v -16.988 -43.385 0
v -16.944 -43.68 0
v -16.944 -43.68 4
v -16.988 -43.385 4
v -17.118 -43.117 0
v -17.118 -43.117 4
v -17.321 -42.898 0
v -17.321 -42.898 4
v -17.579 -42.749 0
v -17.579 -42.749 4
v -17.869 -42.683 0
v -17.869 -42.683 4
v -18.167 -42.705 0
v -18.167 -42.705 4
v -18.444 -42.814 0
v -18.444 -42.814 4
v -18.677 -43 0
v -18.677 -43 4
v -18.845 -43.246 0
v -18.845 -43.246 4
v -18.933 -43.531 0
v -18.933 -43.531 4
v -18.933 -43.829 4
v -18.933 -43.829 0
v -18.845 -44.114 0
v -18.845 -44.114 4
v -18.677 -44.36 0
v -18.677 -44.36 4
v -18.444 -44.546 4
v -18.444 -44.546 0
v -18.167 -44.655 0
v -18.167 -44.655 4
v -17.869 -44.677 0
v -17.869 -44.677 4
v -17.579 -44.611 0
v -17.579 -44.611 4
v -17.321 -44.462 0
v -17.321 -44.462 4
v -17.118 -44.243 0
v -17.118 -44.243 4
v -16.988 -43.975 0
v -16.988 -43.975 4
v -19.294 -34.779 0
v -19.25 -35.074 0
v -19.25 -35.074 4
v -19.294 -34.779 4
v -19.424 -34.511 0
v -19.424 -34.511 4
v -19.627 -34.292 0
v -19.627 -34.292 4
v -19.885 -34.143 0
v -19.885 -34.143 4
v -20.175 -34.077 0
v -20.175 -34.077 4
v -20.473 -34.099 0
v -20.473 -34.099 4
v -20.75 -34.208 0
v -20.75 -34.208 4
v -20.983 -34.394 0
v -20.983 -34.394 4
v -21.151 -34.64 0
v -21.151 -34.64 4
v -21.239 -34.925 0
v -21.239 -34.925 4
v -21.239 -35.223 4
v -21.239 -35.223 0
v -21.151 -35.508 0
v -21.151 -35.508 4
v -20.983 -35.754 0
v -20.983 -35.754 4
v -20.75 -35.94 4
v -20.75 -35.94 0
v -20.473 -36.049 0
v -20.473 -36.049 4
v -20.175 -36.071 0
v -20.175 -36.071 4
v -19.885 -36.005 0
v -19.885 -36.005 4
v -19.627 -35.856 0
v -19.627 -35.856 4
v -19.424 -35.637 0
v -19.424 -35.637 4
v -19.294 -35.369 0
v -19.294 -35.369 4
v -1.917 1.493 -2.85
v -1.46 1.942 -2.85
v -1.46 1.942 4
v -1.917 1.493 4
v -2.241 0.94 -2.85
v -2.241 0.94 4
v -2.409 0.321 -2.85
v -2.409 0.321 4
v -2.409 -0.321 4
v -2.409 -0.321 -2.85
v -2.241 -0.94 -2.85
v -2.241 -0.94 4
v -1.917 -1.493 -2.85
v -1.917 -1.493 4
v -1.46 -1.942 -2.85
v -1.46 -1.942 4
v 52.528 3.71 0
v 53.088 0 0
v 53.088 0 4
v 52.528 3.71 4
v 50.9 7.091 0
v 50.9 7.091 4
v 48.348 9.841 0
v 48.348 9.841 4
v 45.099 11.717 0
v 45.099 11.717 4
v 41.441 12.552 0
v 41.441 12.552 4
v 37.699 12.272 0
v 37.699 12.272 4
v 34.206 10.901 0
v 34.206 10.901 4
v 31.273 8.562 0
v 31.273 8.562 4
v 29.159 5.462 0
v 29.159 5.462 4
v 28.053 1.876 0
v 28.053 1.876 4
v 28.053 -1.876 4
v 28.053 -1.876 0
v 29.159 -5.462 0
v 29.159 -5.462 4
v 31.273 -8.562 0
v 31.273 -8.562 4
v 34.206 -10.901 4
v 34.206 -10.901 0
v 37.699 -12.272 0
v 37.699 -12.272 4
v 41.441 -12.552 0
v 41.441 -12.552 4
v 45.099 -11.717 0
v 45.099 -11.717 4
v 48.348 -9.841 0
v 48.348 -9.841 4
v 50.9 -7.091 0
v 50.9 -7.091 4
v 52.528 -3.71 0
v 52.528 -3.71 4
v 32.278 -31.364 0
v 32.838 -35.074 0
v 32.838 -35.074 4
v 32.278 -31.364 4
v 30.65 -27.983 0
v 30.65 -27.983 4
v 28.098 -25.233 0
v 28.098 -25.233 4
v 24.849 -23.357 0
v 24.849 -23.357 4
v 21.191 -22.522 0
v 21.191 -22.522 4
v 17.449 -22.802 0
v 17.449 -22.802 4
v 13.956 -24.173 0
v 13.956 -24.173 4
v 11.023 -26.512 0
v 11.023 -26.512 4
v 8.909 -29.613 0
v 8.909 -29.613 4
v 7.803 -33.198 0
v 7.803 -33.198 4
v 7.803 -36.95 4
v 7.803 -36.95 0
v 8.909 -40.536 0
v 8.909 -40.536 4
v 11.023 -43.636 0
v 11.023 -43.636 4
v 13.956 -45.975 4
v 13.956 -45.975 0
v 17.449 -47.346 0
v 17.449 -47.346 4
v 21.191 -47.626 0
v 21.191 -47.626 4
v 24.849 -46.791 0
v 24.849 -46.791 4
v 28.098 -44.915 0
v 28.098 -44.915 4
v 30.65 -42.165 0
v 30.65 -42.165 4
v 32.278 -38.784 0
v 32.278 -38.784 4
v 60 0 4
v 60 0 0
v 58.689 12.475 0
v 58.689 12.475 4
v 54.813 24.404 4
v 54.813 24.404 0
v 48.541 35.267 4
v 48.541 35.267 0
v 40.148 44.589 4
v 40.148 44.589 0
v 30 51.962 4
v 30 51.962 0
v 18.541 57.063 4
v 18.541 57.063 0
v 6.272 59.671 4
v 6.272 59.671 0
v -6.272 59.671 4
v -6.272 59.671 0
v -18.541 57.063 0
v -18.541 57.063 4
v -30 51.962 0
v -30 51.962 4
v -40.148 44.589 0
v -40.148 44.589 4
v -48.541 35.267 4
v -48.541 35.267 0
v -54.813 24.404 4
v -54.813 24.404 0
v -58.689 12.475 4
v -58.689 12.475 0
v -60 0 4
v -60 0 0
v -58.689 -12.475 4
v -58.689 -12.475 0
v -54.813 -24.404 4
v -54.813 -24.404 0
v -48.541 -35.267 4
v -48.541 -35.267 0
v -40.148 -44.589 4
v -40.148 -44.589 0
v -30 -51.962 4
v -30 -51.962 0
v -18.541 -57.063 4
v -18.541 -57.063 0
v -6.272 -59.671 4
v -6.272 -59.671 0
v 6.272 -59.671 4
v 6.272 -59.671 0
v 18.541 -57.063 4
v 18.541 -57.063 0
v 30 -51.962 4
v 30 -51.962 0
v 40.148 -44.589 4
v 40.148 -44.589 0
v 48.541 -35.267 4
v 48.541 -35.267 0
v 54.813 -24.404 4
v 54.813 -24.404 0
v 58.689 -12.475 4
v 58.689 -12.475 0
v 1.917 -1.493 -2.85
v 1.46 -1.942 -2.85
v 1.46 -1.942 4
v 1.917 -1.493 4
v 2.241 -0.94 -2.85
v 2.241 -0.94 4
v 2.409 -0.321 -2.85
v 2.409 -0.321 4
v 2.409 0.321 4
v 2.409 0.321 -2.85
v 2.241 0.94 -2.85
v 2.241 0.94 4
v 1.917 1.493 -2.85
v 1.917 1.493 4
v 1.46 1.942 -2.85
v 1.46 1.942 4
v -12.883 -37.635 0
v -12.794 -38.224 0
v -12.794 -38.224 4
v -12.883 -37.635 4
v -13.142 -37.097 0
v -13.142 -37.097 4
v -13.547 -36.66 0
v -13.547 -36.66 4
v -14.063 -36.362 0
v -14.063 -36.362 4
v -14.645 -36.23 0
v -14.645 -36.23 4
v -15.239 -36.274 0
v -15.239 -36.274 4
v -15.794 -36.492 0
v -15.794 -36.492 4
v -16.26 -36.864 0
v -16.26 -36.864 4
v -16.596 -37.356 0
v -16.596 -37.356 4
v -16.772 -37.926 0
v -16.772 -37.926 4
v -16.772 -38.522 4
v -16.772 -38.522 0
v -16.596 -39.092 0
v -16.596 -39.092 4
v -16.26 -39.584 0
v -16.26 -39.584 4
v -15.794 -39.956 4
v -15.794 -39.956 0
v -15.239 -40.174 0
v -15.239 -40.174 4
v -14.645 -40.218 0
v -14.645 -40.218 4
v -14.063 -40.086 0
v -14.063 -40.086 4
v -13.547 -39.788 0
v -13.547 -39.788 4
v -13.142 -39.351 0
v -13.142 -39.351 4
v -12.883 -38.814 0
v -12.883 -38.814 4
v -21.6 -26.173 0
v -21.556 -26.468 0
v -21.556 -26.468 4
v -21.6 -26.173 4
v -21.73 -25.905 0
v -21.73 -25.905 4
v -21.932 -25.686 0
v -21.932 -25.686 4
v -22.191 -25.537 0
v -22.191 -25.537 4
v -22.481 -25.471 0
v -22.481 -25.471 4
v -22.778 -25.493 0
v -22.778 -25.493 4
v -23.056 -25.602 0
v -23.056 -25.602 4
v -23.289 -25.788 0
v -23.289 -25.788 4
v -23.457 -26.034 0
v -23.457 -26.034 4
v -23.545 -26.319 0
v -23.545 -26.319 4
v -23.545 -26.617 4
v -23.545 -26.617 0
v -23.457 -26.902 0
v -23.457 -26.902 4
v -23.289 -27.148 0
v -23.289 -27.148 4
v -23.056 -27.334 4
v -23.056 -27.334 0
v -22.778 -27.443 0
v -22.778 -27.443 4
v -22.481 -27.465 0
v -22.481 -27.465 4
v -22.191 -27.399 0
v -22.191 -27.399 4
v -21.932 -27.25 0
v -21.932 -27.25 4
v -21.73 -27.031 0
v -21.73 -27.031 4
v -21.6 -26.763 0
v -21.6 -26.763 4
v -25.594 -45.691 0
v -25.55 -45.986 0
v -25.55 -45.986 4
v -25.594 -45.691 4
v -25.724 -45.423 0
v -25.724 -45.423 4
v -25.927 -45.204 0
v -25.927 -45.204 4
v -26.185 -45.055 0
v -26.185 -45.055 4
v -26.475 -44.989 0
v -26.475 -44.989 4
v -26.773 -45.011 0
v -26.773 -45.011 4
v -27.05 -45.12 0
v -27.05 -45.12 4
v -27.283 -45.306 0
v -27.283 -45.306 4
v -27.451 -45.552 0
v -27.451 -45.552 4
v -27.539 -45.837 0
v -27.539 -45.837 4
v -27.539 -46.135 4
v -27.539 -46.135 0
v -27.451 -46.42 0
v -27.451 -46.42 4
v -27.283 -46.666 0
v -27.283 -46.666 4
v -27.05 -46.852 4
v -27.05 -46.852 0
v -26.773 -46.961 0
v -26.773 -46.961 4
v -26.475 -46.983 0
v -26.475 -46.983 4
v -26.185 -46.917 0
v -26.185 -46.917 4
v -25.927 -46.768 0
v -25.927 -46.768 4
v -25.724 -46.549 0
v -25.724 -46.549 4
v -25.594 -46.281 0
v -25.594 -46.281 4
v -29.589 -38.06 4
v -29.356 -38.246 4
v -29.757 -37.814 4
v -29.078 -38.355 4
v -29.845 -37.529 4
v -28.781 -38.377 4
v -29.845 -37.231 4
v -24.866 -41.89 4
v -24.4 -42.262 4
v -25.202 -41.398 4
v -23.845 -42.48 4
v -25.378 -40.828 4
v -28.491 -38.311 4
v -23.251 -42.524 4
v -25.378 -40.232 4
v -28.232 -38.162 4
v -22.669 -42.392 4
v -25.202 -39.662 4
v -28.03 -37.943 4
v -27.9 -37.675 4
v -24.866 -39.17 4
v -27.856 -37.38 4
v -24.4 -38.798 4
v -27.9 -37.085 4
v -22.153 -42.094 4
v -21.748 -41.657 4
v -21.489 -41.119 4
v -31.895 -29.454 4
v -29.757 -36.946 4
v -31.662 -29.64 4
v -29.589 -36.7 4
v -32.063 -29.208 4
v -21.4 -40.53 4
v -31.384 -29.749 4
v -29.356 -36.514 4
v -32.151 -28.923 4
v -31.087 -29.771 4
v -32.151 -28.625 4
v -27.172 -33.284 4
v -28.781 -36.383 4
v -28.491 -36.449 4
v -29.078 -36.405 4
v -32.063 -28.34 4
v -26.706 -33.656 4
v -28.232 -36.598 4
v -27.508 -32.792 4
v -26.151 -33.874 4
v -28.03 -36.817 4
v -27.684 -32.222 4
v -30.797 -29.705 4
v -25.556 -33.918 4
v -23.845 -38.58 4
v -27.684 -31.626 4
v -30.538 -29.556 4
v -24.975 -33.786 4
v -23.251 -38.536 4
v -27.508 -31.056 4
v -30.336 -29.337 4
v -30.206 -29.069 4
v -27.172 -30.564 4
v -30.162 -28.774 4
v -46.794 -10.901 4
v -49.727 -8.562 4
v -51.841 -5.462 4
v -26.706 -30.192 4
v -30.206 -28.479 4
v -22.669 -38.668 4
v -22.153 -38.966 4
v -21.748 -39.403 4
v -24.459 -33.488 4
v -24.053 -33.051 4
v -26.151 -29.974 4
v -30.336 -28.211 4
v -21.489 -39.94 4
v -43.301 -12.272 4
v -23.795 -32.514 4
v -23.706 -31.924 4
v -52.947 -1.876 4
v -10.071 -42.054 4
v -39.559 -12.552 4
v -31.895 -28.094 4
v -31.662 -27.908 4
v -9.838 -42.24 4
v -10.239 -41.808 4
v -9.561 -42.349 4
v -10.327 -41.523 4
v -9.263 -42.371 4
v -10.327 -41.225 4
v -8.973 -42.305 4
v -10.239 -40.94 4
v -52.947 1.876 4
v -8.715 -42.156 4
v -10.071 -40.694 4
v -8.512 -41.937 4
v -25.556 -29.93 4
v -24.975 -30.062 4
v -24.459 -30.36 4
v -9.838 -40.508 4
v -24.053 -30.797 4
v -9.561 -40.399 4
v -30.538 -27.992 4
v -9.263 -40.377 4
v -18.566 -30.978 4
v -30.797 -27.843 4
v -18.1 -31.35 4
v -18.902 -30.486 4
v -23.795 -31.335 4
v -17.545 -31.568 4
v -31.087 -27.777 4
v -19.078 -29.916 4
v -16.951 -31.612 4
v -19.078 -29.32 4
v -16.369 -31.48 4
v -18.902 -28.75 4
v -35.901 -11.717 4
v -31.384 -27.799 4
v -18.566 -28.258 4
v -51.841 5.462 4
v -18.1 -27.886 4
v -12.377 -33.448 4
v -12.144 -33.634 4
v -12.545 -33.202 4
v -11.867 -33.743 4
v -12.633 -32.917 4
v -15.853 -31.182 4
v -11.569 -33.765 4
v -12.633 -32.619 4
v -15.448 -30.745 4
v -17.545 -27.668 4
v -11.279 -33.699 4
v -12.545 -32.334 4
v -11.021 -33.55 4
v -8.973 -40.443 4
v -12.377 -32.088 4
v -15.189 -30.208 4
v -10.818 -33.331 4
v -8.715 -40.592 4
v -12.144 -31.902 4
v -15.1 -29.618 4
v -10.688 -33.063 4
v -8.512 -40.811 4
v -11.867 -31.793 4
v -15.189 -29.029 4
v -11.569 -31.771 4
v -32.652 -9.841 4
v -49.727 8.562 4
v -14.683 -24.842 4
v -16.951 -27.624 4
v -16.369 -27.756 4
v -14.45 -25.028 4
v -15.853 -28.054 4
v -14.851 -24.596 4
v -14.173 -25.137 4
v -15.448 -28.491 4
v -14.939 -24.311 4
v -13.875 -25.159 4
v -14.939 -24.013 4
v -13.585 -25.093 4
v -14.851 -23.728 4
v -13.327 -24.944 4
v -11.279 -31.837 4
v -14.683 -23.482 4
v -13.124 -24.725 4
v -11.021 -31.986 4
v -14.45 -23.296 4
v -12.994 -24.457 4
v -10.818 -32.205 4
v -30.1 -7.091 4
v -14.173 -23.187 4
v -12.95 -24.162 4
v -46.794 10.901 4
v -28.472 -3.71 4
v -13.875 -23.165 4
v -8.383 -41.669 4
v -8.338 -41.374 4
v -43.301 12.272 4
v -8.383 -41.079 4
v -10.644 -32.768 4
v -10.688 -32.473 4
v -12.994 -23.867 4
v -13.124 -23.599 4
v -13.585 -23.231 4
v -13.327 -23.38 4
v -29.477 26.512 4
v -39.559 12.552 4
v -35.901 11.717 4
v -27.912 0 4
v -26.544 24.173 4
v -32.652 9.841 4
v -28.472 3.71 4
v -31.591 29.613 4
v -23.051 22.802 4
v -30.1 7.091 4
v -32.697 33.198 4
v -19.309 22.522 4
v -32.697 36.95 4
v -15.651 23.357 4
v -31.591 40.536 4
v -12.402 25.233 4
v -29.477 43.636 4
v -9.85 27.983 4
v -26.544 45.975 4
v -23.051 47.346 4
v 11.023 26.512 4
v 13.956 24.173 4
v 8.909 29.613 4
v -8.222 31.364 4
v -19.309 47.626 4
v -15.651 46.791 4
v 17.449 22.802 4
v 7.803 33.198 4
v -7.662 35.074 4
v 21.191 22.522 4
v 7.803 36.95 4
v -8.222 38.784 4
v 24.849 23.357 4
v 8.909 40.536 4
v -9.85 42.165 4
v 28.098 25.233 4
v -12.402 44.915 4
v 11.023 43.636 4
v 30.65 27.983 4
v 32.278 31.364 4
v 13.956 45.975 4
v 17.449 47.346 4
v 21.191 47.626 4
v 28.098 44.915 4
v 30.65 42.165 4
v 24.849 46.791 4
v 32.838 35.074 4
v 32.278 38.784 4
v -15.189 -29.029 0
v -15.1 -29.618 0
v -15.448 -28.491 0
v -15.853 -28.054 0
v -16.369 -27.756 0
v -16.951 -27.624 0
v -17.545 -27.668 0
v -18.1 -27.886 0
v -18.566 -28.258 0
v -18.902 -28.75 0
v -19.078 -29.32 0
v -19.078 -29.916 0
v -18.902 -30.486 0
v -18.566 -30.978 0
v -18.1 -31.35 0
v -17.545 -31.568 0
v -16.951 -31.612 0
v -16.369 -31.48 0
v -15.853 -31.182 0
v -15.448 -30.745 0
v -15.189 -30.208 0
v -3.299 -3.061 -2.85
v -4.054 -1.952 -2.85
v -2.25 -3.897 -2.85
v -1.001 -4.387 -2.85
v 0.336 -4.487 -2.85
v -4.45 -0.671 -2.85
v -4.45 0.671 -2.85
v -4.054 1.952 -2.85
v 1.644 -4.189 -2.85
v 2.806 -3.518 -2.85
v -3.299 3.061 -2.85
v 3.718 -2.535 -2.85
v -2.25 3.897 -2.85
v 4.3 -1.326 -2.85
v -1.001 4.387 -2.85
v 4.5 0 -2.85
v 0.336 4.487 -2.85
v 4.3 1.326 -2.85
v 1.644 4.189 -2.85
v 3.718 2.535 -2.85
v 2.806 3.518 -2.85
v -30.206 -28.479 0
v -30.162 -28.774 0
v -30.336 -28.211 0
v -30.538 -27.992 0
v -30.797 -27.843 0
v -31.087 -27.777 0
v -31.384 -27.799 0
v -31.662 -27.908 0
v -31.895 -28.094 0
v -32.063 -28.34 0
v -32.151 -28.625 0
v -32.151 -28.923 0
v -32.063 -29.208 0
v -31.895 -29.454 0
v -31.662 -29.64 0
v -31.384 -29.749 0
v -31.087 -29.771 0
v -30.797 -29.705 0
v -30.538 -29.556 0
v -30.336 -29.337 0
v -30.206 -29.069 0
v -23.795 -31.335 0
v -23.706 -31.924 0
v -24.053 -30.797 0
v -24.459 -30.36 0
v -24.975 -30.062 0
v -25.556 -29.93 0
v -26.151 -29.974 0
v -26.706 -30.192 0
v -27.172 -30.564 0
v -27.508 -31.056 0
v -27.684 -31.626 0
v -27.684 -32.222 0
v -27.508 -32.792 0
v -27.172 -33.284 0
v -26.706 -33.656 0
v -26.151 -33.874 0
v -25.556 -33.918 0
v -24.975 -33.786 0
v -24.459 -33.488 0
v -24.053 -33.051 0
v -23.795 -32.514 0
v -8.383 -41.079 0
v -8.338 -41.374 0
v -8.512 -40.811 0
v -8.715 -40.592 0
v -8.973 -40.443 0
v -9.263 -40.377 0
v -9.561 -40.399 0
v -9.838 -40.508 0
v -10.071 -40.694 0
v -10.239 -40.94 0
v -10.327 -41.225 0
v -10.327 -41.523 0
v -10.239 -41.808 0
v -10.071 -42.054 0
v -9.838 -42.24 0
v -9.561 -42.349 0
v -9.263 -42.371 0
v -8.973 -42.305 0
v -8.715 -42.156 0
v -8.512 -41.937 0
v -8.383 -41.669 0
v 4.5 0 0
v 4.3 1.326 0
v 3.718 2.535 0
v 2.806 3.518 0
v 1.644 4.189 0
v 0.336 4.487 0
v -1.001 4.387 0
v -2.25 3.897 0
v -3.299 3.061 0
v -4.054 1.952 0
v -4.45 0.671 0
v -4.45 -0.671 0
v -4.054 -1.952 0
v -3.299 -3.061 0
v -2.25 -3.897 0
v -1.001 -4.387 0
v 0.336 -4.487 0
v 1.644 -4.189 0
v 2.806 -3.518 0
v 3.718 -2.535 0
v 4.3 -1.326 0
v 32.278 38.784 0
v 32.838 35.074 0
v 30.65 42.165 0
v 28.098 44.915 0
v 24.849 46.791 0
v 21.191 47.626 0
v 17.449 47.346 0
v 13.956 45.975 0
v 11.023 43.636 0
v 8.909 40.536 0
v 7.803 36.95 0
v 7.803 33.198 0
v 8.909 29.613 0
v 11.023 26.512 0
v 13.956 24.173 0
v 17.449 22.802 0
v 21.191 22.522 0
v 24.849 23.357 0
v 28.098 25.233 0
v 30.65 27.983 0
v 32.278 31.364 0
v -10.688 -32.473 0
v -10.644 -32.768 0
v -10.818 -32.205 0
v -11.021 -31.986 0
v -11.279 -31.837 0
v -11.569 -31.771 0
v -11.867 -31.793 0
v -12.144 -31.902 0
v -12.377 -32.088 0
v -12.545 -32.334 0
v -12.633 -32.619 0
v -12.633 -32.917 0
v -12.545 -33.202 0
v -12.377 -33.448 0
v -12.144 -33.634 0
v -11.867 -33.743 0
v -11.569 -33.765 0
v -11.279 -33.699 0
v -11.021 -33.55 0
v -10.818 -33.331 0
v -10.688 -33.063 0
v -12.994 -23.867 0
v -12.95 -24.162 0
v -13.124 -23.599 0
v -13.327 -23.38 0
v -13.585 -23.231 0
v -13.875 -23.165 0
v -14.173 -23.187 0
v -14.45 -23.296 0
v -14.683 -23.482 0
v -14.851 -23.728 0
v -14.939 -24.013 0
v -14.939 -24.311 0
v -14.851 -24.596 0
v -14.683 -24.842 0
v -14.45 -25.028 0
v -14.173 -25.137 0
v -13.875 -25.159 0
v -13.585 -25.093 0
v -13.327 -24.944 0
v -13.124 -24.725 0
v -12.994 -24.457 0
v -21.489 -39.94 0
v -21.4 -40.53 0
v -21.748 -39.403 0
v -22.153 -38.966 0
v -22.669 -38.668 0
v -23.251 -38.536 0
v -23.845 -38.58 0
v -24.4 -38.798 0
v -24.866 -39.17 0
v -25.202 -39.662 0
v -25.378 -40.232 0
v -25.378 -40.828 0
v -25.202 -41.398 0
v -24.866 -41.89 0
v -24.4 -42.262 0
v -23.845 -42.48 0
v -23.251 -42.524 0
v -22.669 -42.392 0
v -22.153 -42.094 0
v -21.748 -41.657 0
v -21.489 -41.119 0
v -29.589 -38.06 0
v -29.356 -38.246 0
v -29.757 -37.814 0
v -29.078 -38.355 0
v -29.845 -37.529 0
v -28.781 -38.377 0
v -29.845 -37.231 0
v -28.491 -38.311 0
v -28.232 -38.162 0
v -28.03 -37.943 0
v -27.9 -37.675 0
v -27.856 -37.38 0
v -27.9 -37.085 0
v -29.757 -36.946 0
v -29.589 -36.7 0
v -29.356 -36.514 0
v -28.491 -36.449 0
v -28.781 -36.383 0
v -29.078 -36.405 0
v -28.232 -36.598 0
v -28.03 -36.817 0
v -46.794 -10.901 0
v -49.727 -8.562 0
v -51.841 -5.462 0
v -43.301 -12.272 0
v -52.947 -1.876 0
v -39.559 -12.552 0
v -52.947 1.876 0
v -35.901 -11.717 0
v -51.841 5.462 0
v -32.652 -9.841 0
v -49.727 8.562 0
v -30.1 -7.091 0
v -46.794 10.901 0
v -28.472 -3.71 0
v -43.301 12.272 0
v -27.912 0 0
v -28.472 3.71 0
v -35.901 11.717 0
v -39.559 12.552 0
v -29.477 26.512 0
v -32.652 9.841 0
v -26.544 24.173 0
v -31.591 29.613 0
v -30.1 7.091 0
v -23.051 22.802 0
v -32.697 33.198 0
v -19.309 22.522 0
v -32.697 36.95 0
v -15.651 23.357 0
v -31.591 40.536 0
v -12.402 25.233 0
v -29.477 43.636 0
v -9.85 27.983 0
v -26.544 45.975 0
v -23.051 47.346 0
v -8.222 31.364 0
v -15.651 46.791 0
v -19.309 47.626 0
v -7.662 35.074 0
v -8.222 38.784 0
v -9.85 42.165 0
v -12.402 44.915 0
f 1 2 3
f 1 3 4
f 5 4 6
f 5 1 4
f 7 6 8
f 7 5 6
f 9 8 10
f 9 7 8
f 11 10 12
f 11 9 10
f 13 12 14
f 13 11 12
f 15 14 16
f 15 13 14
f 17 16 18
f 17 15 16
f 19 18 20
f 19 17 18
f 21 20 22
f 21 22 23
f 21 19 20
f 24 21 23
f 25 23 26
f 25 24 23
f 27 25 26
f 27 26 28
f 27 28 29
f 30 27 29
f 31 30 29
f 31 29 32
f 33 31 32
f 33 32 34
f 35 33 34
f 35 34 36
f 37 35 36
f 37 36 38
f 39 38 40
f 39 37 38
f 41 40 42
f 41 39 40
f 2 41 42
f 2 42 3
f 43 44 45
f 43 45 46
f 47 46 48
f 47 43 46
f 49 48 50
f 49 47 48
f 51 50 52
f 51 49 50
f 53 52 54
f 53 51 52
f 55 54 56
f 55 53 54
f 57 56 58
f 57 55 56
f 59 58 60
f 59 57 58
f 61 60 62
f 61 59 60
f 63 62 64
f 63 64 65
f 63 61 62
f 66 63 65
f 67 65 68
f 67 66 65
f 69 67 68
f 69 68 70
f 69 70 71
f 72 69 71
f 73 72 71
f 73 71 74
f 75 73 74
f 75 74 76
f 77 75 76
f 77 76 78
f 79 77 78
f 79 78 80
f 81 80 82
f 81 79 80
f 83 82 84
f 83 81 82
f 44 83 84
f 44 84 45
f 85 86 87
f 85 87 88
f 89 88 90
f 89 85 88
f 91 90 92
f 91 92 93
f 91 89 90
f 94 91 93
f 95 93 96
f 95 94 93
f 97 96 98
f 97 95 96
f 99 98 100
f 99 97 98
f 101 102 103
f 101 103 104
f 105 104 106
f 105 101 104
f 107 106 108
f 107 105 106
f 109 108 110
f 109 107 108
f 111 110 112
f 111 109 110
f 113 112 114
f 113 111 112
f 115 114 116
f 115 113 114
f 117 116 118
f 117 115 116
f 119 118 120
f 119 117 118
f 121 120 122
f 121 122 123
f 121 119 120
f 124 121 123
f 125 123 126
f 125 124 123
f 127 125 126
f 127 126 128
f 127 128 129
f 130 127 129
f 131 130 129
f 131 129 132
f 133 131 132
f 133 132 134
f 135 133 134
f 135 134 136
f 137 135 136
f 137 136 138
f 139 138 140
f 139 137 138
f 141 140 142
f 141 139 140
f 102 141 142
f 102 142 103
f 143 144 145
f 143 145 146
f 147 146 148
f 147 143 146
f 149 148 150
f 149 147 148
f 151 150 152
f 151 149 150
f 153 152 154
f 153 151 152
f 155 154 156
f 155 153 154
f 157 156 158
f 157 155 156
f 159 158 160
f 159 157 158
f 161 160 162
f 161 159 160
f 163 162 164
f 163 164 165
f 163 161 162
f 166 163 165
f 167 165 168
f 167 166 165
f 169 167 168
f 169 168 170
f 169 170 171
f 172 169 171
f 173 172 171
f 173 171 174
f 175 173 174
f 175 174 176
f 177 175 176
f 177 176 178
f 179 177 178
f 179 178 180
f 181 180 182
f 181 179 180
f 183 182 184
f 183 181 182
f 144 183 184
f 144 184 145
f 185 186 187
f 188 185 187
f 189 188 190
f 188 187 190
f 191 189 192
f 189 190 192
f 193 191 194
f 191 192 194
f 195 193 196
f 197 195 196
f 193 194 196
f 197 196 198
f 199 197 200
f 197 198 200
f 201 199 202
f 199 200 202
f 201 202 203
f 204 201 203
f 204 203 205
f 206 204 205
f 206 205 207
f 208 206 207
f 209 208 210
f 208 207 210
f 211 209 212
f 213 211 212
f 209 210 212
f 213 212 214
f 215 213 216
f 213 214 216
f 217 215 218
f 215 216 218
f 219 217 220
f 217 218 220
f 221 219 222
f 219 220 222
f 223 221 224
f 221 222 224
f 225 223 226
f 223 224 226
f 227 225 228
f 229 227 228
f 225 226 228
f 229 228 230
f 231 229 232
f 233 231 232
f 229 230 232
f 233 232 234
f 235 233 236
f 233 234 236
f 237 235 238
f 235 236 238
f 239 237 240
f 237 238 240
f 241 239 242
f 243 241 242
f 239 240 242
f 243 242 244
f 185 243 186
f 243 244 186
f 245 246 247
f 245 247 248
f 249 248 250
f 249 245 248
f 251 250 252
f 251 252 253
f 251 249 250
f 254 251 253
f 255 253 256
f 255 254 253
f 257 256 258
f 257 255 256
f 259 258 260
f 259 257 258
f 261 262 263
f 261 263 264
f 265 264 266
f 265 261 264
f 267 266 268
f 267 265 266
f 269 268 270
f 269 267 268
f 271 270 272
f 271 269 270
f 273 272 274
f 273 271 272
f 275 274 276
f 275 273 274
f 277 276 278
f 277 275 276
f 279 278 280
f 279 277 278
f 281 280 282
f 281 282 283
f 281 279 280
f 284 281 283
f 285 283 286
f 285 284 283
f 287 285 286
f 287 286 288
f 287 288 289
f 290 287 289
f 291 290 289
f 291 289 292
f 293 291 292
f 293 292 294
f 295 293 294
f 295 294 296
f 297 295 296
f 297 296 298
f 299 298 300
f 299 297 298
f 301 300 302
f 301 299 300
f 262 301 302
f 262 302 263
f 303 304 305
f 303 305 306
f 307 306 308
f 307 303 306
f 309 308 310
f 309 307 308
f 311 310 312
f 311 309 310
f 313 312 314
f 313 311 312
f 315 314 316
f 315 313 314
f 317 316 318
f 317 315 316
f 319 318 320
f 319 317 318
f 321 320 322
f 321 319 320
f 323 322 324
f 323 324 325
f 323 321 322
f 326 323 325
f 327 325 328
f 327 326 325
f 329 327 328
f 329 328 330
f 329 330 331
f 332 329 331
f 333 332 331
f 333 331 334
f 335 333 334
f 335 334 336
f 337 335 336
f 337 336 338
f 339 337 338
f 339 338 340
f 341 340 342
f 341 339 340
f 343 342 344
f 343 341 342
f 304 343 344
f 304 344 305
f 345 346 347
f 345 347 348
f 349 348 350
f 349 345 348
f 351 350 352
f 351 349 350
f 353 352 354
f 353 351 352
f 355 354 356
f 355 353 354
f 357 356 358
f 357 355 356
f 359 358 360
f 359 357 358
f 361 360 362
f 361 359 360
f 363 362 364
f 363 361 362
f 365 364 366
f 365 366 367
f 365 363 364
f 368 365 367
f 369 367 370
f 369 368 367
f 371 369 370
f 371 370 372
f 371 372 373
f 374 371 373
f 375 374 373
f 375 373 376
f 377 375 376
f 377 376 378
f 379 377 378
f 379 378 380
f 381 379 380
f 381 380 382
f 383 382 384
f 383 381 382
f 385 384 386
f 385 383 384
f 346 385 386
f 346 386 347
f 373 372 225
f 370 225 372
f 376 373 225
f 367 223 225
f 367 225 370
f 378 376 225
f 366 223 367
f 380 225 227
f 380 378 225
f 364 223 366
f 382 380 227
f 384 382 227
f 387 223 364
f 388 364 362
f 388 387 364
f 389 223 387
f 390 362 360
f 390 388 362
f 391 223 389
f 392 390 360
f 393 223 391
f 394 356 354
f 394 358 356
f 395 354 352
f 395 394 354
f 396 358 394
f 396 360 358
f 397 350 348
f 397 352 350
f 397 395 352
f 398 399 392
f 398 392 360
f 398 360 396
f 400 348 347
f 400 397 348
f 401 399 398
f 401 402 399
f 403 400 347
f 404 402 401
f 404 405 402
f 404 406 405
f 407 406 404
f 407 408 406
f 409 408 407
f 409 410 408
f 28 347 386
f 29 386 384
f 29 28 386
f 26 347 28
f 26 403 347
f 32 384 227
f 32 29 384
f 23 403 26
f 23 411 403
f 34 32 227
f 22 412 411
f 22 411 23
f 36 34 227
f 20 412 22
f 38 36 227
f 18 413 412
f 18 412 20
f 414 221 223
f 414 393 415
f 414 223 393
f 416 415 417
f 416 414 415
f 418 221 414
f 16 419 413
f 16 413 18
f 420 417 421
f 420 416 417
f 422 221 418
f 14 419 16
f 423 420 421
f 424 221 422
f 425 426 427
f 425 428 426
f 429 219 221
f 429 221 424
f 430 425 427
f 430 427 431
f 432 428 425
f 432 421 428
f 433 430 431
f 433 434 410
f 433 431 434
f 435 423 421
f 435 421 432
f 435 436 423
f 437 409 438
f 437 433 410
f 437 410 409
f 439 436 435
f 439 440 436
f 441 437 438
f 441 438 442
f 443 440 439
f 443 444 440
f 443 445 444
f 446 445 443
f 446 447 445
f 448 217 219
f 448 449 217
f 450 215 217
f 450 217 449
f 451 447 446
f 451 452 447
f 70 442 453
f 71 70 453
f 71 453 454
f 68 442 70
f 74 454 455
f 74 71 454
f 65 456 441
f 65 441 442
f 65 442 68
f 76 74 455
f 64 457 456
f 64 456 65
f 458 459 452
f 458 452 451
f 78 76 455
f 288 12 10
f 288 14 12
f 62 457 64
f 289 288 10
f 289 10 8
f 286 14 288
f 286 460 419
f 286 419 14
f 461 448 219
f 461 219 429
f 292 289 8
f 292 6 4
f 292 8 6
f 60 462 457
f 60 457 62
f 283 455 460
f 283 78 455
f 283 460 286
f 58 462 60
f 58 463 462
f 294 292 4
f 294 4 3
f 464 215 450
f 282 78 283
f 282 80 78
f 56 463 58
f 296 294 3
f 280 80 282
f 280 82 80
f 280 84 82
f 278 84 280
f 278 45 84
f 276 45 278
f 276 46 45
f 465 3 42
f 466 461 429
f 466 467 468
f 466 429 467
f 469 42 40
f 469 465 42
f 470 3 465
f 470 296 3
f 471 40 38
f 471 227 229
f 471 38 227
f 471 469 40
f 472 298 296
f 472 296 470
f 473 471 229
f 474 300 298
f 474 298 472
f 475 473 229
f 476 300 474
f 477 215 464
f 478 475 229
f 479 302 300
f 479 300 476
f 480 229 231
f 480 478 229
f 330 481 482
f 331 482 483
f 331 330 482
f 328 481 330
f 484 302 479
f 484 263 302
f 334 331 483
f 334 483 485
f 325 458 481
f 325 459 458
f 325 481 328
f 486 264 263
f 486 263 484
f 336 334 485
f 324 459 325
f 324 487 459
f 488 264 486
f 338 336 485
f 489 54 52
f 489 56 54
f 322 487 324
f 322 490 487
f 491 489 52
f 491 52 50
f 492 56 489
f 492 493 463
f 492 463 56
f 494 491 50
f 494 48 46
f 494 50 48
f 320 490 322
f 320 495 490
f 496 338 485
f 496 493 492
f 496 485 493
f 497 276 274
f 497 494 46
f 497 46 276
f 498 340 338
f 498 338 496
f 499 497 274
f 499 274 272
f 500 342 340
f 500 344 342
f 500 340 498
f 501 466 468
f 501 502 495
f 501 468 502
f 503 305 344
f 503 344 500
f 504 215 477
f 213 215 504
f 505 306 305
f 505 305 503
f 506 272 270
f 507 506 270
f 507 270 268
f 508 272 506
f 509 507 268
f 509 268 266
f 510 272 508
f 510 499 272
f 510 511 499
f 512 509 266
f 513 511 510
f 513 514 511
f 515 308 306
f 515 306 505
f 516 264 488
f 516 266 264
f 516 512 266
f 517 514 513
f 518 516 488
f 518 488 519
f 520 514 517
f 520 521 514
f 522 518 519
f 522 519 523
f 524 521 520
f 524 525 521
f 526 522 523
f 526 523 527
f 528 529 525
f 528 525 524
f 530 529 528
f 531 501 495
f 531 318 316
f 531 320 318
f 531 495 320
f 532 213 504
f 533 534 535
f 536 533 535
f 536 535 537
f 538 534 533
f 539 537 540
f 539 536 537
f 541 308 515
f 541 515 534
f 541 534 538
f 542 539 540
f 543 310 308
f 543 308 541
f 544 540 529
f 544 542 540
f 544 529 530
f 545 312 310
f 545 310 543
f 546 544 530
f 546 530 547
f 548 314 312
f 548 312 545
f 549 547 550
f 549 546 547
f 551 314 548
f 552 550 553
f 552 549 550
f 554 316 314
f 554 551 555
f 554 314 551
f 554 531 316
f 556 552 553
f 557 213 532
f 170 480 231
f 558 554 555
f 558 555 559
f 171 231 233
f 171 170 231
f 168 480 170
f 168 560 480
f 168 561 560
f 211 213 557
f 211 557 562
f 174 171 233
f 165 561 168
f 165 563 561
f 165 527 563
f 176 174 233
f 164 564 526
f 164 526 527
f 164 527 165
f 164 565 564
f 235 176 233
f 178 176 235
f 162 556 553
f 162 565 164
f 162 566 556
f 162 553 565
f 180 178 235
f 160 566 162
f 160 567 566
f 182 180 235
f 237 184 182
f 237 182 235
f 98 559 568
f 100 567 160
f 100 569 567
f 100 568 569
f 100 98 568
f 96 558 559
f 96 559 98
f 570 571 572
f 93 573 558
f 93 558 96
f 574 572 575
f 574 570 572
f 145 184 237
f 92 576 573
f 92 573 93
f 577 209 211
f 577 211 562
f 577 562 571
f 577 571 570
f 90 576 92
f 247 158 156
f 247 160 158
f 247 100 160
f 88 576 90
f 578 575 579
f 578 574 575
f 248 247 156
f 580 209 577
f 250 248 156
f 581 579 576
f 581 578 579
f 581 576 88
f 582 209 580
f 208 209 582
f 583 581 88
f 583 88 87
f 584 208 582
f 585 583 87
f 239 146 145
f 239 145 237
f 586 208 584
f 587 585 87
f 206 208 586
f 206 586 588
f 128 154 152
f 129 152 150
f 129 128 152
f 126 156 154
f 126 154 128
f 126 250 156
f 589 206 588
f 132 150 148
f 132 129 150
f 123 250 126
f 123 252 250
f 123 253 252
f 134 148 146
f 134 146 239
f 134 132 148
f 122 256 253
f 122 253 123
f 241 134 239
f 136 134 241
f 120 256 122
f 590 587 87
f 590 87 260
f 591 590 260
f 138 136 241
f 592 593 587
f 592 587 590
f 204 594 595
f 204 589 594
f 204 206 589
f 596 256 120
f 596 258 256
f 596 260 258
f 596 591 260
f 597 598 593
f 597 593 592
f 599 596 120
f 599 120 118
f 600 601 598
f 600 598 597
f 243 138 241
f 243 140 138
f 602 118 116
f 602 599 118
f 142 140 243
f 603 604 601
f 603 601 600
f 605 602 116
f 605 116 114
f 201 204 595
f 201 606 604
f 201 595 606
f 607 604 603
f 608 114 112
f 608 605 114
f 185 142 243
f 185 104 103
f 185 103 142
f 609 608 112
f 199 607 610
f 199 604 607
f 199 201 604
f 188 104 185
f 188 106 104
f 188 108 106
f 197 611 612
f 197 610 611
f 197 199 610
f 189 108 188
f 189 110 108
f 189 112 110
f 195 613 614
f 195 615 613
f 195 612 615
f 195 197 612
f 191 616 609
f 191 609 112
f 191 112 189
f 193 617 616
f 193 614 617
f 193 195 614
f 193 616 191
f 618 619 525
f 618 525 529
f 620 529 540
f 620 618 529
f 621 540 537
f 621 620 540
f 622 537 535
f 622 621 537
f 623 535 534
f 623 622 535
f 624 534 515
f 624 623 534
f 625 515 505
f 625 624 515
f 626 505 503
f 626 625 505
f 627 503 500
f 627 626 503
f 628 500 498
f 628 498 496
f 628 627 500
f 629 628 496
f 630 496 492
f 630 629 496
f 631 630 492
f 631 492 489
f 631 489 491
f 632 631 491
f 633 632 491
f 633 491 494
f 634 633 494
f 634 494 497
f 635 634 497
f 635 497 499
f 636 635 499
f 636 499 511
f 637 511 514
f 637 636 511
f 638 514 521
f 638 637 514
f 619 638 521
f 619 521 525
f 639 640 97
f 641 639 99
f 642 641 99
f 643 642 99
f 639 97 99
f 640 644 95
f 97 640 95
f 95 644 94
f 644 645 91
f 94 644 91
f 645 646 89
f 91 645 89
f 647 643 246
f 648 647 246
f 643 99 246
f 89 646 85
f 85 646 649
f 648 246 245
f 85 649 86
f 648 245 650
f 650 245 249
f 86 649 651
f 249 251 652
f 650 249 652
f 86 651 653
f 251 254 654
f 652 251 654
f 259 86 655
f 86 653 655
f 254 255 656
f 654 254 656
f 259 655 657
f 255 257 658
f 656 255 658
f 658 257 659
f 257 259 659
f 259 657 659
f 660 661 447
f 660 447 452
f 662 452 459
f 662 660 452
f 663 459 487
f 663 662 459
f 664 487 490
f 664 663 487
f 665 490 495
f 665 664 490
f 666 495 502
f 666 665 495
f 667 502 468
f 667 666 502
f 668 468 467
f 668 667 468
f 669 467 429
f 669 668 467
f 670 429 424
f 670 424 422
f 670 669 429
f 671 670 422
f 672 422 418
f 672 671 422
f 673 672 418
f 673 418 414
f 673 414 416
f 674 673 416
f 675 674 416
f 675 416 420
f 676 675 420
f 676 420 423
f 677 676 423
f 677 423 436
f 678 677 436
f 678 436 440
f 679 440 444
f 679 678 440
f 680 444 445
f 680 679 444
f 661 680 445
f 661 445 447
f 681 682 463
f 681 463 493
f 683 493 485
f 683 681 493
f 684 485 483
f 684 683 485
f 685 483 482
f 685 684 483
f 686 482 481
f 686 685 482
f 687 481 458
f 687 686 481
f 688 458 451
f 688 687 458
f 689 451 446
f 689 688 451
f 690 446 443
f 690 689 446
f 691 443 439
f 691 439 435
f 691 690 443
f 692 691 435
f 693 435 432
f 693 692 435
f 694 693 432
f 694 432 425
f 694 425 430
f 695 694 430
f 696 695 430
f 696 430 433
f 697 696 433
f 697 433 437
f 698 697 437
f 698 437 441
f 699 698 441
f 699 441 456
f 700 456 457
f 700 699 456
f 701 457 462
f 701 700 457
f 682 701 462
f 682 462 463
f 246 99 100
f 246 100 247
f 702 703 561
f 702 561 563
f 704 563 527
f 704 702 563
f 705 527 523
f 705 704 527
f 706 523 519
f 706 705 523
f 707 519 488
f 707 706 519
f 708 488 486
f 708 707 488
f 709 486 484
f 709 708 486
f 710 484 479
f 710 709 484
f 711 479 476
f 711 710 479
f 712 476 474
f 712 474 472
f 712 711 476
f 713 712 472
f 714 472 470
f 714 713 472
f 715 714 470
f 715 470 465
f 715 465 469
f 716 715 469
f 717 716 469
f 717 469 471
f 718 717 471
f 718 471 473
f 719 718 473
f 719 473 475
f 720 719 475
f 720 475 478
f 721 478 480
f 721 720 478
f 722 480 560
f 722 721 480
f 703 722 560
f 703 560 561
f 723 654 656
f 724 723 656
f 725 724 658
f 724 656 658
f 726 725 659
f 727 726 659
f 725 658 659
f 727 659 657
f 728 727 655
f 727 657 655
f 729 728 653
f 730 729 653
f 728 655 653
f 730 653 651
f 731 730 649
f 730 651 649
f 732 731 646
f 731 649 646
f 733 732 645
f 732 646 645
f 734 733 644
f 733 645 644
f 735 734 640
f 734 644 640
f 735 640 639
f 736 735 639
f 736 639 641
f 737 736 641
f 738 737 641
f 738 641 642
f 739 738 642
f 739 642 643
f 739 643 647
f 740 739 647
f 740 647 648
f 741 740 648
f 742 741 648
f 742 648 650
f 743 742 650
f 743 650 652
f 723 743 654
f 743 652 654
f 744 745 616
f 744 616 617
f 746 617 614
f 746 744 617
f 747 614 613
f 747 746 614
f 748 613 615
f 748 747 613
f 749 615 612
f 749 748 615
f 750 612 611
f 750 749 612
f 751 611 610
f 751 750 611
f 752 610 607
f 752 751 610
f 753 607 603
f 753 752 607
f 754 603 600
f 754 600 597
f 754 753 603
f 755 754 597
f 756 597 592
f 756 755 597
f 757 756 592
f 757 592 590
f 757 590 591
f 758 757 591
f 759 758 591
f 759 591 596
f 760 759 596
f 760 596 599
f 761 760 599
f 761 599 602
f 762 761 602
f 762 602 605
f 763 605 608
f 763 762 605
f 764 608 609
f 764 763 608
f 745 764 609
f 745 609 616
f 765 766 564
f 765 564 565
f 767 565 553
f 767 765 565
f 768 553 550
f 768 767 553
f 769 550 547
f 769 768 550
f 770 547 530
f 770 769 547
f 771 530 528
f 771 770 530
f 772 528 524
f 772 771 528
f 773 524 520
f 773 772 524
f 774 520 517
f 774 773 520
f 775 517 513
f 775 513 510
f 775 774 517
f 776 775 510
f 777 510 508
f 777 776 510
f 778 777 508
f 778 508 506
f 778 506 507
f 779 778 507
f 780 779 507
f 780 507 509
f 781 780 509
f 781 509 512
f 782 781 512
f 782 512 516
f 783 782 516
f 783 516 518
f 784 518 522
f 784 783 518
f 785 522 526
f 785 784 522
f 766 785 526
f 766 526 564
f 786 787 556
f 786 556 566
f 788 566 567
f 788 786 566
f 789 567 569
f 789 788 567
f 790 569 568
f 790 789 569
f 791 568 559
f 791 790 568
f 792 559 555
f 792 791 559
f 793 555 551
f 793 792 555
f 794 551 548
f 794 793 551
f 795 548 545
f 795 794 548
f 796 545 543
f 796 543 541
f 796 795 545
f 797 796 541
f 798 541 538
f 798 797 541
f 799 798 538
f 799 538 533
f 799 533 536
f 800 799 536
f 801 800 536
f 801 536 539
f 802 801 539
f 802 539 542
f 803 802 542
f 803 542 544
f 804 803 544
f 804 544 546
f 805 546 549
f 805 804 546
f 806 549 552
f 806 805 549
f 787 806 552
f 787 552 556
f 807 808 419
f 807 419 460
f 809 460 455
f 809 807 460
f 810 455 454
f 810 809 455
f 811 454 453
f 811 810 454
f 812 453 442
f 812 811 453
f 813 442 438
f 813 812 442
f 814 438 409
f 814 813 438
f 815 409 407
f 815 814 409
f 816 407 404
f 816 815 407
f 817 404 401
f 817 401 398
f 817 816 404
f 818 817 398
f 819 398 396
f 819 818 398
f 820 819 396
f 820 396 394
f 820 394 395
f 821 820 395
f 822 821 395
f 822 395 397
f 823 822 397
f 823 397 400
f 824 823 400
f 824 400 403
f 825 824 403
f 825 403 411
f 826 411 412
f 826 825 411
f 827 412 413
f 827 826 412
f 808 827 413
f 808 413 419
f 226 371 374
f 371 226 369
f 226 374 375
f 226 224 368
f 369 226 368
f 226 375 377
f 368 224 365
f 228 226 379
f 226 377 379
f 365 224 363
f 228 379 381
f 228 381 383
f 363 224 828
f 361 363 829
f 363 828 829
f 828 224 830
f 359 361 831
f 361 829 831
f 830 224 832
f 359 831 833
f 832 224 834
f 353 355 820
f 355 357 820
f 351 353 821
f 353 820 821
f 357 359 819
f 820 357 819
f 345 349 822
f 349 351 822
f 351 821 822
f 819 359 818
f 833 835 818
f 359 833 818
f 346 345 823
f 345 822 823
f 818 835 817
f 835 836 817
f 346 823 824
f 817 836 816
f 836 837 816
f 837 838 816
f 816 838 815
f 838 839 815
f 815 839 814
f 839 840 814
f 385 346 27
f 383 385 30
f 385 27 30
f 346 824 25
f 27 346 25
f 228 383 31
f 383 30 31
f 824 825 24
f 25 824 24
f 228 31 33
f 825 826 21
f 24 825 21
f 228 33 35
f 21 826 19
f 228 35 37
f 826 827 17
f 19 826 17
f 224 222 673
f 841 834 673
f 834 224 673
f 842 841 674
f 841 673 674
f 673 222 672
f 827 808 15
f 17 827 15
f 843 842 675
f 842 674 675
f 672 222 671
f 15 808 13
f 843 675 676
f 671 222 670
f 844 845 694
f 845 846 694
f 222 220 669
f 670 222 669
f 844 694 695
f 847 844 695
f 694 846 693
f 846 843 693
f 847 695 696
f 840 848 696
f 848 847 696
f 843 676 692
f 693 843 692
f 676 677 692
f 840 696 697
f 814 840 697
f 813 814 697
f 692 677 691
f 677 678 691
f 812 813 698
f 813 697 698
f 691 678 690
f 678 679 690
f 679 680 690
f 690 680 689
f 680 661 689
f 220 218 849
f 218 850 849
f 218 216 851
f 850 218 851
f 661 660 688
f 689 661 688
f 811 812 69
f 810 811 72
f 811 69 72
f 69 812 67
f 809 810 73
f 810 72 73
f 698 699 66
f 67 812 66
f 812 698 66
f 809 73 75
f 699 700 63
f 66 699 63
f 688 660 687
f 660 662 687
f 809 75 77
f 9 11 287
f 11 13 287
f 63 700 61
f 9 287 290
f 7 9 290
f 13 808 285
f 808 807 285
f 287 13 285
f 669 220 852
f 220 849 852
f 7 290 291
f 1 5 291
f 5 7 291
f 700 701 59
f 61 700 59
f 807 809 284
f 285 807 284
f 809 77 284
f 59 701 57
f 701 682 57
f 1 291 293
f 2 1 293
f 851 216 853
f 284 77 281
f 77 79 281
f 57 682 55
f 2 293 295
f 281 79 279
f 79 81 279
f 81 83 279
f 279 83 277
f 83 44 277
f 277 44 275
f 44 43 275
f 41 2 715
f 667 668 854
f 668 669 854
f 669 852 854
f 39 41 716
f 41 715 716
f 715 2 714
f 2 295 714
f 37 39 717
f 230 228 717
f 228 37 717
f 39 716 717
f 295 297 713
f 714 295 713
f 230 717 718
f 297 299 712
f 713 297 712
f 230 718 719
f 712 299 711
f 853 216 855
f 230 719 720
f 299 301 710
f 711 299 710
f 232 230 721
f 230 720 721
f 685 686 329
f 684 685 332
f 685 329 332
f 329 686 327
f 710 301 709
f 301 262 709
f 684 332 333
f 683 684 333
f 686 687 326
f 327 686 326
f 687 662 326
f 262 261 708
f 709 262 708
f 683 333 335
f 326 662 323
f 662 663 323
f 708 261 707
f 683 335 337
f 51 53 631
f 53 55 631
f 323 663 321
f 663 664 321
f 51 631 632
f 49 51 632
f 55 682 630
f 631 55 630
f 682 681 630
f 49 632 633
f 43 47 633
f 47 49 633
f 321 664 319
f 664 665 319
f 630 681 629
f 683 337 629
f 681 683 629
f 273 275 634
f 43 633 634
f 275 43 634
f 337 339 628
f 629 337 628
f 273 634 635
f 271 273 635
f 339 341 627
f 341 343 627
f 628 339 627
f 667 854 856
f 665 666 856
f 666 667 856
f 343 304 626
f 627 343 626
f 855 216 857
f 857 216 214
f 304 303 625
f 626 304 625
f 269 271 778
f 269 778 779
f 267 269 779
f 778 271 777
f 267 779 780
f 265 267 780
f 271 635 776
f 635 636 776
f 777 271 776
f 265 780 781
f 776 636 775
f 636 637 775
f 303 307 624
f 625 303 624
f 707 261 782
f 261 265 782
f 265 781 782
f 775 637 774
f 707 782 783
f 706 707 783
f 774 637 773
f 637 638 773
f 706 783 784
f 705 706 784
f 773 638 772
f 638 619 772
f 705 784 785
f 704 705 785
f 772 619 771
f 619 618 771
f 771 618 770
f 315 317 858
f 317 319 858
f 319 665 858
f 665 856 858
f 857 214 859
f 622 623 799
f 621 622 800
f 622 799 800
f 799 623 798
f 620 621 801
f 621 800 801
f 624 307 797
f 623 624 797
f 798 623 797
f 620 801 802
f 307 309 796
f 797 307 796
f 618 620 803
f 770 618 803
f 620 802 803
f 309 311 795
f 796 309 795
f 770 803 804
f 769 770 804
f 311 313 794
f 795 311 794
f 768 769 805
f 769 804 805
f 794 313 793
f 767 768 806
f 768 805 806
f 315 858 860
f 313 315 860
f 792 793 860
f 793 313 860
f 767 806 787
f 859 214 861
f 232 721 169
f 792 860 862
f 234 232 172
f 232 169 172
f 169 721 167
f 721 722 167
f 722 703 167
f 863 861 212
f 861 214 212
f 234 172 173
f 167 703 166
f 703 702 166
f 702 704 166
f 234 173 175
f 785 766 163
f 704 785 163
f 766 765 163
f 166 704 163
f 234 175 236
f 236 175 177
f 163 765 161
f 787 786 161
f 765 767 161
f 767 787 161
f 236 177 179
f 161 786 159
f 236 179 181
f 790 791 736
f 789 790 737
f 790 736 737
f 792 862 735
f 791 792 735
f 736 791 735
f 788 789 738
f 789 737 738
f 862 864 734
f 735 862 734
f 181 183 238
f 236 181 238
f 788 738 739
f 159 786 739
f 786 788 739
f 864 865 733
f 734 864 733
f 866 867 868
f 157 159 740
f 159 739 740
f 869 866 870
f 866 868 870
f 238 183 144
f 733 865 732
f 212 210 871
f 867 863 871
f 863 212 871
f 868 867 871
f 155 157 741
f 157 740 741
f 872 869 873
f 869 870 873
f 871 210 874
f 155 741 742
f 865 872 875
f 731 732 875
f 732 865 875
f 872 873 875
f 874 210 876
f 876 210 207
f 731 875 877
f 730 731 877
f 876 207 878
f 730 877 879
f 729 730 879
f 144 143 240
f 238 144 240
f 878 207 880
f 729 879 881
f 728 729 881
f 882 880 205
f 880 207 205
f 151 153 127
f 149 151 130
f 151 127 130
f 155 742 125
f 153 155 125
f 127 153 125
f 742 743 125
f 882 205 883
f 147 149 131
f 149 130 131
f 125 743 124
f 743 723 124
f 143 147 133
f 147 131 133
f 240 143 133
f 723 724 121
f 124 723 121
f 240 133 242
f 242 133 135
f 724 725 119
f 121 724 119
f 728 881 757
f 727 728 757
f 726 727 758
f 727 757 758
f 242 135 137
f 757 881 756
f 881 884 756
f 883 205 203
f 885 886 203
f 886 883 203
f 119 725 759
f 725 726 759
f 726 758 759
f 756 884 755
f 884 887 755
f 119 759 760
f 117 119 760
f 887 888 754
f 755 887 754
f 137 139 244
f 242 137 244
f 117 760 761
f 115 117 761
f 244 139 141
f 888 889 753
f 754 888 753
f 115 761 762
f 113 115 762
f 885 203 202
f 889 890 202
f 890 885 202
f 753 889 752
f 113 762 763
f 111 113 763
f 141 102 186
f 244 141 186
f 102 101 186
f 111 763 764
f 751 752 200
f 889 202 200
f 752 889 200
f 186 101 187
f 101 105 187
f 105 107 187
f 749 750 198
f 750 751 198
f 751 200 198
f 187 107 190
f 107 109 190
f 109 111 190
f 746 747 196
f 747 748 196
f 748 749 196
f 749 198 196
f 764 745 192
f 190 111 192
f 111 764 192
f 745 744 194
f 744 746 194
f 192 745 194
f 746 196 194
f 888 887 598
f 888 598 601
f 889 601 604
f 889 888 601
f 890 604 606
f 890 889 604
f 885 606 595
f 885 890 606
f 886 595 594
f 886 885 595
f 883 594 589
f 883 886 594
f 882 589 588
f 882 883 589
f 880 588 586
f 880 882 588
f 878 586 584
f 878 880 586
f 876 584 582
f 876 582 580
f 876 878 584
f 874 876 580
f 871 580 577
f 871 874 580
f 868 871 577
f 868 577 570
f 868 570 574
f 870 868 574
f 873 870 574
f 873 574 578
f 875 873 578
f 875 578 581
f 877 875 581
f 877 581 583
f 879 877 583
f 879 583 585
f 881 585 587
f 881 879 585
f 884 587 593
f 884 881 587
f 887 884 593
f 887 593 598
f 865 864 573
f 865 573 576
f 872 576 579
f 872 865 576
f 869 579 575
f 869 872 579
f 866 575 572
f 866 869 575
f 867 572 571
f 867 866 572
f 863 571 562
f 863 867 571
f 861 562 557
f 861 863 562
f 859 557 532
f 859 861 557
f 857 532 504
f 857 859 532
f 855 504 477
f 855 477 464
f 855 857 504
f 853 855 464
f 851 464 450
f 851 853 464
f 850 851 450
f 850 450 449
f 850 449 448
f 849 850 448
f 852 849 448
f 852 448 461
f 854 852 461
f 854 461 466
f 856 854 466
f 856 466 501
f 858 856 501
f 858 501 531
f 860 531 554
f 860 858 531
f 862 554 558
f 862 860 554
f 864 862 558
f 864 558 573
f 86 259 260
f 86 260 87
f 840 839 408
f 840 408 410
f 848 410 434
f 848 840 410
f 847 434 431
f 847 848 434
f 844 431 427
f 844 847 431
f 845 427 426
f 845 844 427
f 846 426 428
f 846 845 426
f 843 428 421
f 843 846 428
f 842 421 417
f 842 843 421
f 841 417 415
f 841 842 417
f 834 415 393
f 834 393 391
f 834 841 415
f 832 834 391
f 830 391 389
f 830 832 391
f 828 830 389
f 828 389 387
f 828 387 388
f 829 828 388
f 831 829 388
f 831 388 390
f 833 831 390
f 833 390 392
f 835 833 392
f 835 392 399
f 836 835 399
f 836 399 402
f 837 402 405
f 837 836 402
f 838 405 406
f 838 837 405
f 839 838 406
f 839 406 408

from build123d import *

# Parameters (mm, degrees)
SKETCH_1_R          = 60
EXTRUDE_1_DEPTH     = 4
SKETCH_2_R          = 12.5875
SKETCH_2_R_2        = 1
SKETCH_2_R_3        = 2
CUT_EXTRUDE_2_DEPTH = 4
EXTRUDE_START       = -2.85
SKETCH_2_4_R        = 4.5
EXTRUDE_2_DEPTH     = 2.85


with BuildPart() as part:
    # 草圖1 → 填料-伸長1 (new body)
    with BuildSketch(Plane.XY):
        Circle(SKETCH_1_R)
    extrude(amount=EXTRUDE_1_DEPTH)

    # 草圖2 → 除料-伸長2 (cut)
    with BuildSketch(Plane.XY):
        with BuildLine():
            ThreePointArc((-1.46, 1.942498391), (-2.43, 0), (-1.46, -1.942498391))
            Line((-1.46, -1.942498391), (1.46, -1.942498391))
            ThreePointArc((1.46, -1.942498391), (2.43, 0), (1.46, 1.942498391))
            Line((1.46, 1.942498391), (-1.46, 1.942498391))
        make_face()
        with Locations((-40.5, 0)):
            Circle(SKETCH_2_R)
        with Locations((-20.25, 35.074028853)):
            Circle(SKETCH_2_R)
        with Locations((20.25, 35.074028853)):
            Circle(SKETCH_2_R)
        with Locations((40.5, 0)):
            Circle(SKETCH_2_R)
        with Locations((20.25, -35.074028853)):
            Circle(SKETCH_2_R)
        with Locations((-20.25, -35.074028853)):
            Circle(SKETCH_2_R_2)
        with Locations((-17.1, -29.618068809)):
            Circle(SKETCH_2_R_3)
        with Locations((-22.555960044, -26.468068809)):
            Circle(SKETCH_2_R_2)
        with Locations((-11.644039956, -32.768068809)):
            Circle(SKETCH_2_R_2)
        with Locations((-17.944039956, -43.679988897)):
            Circle(SKETCH_2_R_2)
        with Locations((-28.855960044, -37.379988897)):
            Circle(SKETCH_2_R_2)
        with Locations((-14.794039956, -38.224028853)):
            Circle(SKETCH_2_R_3)
        with Locations((-25.705960044, -31.924028853)):
            Circle(SKETCH_2_R_3)
        with Locations((-23.4, -40.529988897)):
            Circle(SKETCH_2_R_3)
        with Locations((-31.161920088, -28.774028853)):
            Circle(SKETCH_2_R_2)
        with Locations((-13.95, -24.162108766)):
            Circle(SKETCH_2_R_2)
        with Locations((-9.338079912, -41.374028853)):
            Circle(SKETCH_2_R_2)
        with Locations((-26.55, -45.985948941)):
            Circle(SKETCH_2_R_2)
    extrude(amount=CUT_EXTRUDE_2_DEPTH, mode=Mode.SUBTRACT)

    # 草圖2<4> → 填料-伸長2 (add)
    with BuildSketch(Plane.XY.offset(EXTRUDE_START)):
        Circle(SKETCH_2_4_R)
        with BuildLine():
            ThreePointArc((1.46, -1.942498391), (2.43, 0), (1.46, 1.942498391))
            Line((1.46, 1.942498391), (-1.46, 1.942498391))
            ThreePointArc((-1.46, 1.942498391), (-2.43, 0), (-1.46, -1.942498391))
            Line((-1.46, -1.942498391), (1.46, -1.942498391))
        make_face(mode=Mode.SUBTRACT)
    extrude(amount=EXTRUDE_2_DEPTH)


solid = part.part
